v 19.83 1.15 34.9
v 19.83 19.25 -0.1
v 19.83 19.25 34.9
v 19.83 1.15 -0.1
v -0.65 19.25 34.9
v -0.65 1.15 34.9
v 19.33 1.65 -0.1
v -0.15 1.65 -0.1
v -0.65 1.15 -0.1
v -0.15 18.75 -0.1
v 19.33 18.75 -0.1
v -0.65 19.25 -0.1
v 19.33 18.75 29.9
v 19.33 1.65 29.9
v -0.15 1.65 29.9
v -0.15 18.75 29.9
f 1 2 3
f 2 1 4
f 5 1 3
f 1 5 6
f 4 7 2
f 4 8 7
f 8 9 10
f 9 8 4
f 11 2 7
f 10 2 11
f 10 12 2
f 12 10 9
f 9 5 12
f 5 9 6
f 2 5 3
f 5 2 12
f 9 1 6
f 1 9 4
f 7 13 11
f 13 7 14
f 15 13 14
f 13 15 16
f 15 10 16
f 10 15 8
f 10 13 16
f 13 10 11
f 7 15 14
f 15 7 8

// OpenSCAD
// file: rgb_shield.scad
$fn        = 100;

rgb_pcb_x      = 19;
rgb_pcb_y      = 16.55;
rgb_pcb_z      = 2.4;
rgb_hole_diam  = 1;
rgb_hole_pitch = 2.6;
rgb_hole_offset = 1.4;

module rgb_pcb() {
  color("DarkOliveGreen")
  difference() {
    cube(size=[rgb_pcb_x, rgb_pcb_y, rgb_pcb_z]);

    for ( i = [0 : 5] ) {
      translate([rgb_hole_offset + (i * rgb_hole_pitch), rgb_pcb_y - rgb_hole_offset, 0])
      cylinder(r=rgb_hole_diam/2, h=10, center=true);
    }

    for ( i = [0 : 2] ) {
      translate([rgb_pcb_x - rgb_hole_offset, rgb_hole_offset + (i * rgb_hole_pitch), 0])
      cylinder(r=rgb_hole_diam/2, h=10, center=true);
    }
  }
}

module resistor() {
  res_end_r = 1.14;
  res_l = 6.7;
  pitch = 7.7;
  lead_r = 0.2;

  translate([0,0,res_end_r]) {
    color("Tan")
    translate([(pitch - res_l + res_end_r)/2,0,0]) {
      translate([res_end_r,0,0]) sphere(res_end_r);
      translate([res_end_r/2,0,0]) rotate([0,90,0]) cylinder(r=0.95, h=res_l - (res_end_r*2));
      translate([res_l - (res_end_r*2),0,0]) sphere(res_end_r);
    }

    color("Silver") translate([lead_r/2, 0, 0]) sphere(lead_r);
    color("Silver") translate([lead_r/2, 0, 0]) rotate([0,90,0]) cylinder(r=lead_r, h=pitch - lead_r);
    color("Silver") translate([pitch - lead_r/2, 0, 0]) sphere(lead_r);
  }

  color("Silver") translate([lead_r/2,0,0]) cylinder(r=lead_r, h=res_end_r);
  color("Silver") translate([pitch - lead_r/2,0,0]) cylinder(r=lead_r, h=res_end_r);
}

module led() {
  led_r = 2.5;
  led_h = 8.8;
  ridge_r = 2.935;
  lead_pitch = 1.625;
  lead_length = 5;
  lead_lw = 0.7;
  below_pcb = 0.3;

  color("White")
  translate([0,0,lead_length - below_pcb])
  difference() {
    union() {
      translate([0,0,led_h-led_r]) sphere(r=led_r);
      cylinder(r=led_r, h=led_h-led_r);
      cylinder(r=ridge_r, h=1);
    }
    translate([led_r,-5,-1]) cube(size=[10, 10, 10]);
  }
  color("Silver") {
    for ( i = [-1.5 : 1.5] ) {
      translate([(i * -lead_pitch)-lead_lw/4,0,-below_pcb+lead_length/2]) cube(size=[lead_lw, lead_lw, lead_length], center=true);
    }
  }
}

module rgb_header() {
  cube(size=[2.6, 2.6, 2.6], center=true);
}

module rgb_headers() {
  for ( i = [0 : 5] ) {
    color("DimGray")
    translate([rgb_hole_offset + (i * rgb_hole_pitch), rgb_pcb_y - rgb_hole_offset, -1.3]) rgb_header();
    translate([rgb_hole_offset + (i * rgb_hole_pitch), rgb_pcb_y - rgb_hole_offset, 1.45-11.3+rgb_pcb_z]) cylinder(r=rgb_hole_diam/2, h=11.3);
  }

  for ( i = [0 : 2] ) {
    color("DimGray")
    translate([rgb_pcb_x - rgb_hole_offset, rgb_hole_offset + (i * rgb_hole_pitch), -1.3]) rgb_header();
    translate([rgb_pcb_x - rgb_hole_offset, rgb_hole_offset + (i * rgb_hole_pitch), 1.45-11.3+rgb_pcb_z]) cylinder(r=rgb_hole_diam/2, h=11.3);
  }
}

module shield_assembly() {
  rgb_pcb();
  translate([1.15,2.4,rgb_pcb_z]) rotate([0,0,90]) resistor();
  translate([3.65,2.4,rgb_pcb_z]) rotate([0,0,90]) resistor();
  translate([14.9,2.4,rgb_pcb_z]) rotate([0,0,90]) resistor();
  translate([9.71,7,0]) led();
  rgb_headers();
}

// shield_assembly();
// file: digispark.scad
$fn        = 50;

pcb_x      = 19.18;
pcb_y      = 17.66;
pcb_z      = 2.4;
usb_x      = 12.26;
usb_y      = 8.79;
hole_diam  = 1;
hole_pitch = 2.6;
hole_offset = 1.4;

module pcb() {
  color("DarkOliveGreen")
  difference() {
    union() {
      // main PCB
      cube(size=[pcb_x, pcb_y, pcb_z], center=false);

      // USB connector
      translate([(pcb_x - usb_x)/2,-usb_y,0])
      cube(size=[usb_x, usb_y, pcb_z], center=false);
    }

    for ( i = [0 : 5] ) {
      translate([hole_offset + (i * hole_pitch), pcb_y - hole_offset, 0])
      cylinder(r=hole_diam/2, h=10, center=true);
    }

    for ( i = [0 : 2] ) {
      translate([pcb_x - hole_offset, hole_offset + 1.2 + (i * hole_pitch), 0])
      cylinder(r=hole_diam/2, h=10, center=true);
    }
  }

  pad_spacing_a = 1.00;
  pad_spacing_b = 0.65;
  pad_a = [1.96, 8.0, 0.02];
  pad_b = [1.48, 6.9, 0.02];
  usb_pad_width = (pad_spacing_a * 2) + (pad_spacing_b * 2) + (pad_a[0] * 2) + (pad_b[0] * 2);


  color("Gold") {
    for ( i = [0 : 5] ) {
      difference() {
        translate([hole_offset + (i * hole_pitch), pcb_y - hole_offset, pcb_z])
        cylinder(r=hole_diam, h=0.02, center=true);
        translate([hole_offset + (i * hole_pitch), pcb_y - hole_offset, 0])
        cylinder(r=hole_diam/2, h=10, center=true);
      }

    }

    for ( i = [0 : 2] ) {
      difference() {
        translate([pcb_x - hole_offset, hole_offset + 1.2 + (i * hole_pitch), pcb_z])
        cylinder(r=hole_diam, h=0.02, center=true);
        translate([pcb_x - hole_offset, hole_offset + 1.2 + (i * hole_pitch), 0])
        cylinder(r=hole_diam/2, h=10, center=true);
      }
    }

    translate([usb_pad_width/2 - (pad_a[0] - pad_b[0])/2,0,0]) {
      translate([    0, -8.0, pcb_z]) cube(size=pad_a);
      translate([ pad_a[0] + pad_spacing_a, -6.9, pcb_z]) cube(size=pad_b);
      translate([ pad_a[0] + pad_b[0] + pad_spacing_a + pad_spacing_b, -6.9, pcb_z]) cube(size=pad_b);
      translate([ pad_a[0] + pad_b[0] + pad_b[0] + pad_spacing_a + pad_spacing_b + pad_spacing_a, -8.0, pcb_z]) cube(size=pad_a);
    }
  }

}

module vreg_leg() {
  color("Silver")
  union() {
    translate([0, 0, 0.8]) cube(size=[0.8, 0.8, 0.8], center=false);
    translate([0, 1.36, -0.1]) rotate([45,0,0])  cube(size=[0.8, 0.8, 1.6], center=false);
    translate([0, 0.8, 0]) cube(size=[0.8, 2.2, 0.8], center=false);
  }
}

module atmel_leg() {
  color("Silver")
  union() {
    translate([0, 0, 0.48]) cube(size=[0.48, 0.48, 0.48], center=false);
    translate([0, 0.82, -0.06]) rotate([45,0,0])  cube(size=[0.48, 0.48, 0.96], center=false);
    translate([0, 0.48, 0]) cube(size=[0.48, 1.16, 0.48], center=false);
  }
}

module smd_comp() {
  color("Silver") translate([0,0,0]) cube(size=[0.48, 0.35, 0.2], center=false);
  color("DimGray") translate([0,0.35,0]) cube(size=[0.48, 0.55, 0.2], center=false);
  color("Silver") translate([0,0.35+0.55,0]) cube(size=[0.48, 0.35, 0.2], center=false);
}

module chips() {
  // vreg
  vreg_w = 7;
  vreg_l = 5;
  vreg_x = 7.5;
  vreg_y = 3.9;
  vreg_x2 = vreg_x + vreg_w;
  vreg_y2 = vreg_y + vreg_l;

  color("DimGray") translate([vreg_x, 3.9, pcb_z]) cube(size=[7, 5, 2.35], center=false);
  color("Silver") translate([(vreg_x + (7 - 5.45)/2), 3.9-1.4, pcb_z]) cube(size=[5.45, 1.4, 0.39], center=false);

  translate([vreg_x, vreg_y2, pcb_z]) vreg_leg();
  translate([vreg_x - 0.4 + vreg_w/2, vreg_y2, pcb_z]) vreg_leg();
  translate([vreg_x2 - 0.8, vreg_y2, pcb_z]) vreg_leg();

  // atmel
  color("DimGray")
  translate([0.25, 6.16, pcb_z]) cube(size=[5.11, 5.11, 1.44], center=false);

  atmel_pitch = 5.11/3 - 0.48/2;

  for ( i = [0 : 3] ) {
     translate([0.25+0.48+(0.48/4) + (atmel_pitch*i),6.16,pcb_z]) rotate([0,0,180]) atmel_leg();
  }

  for ( i = [0 : 3] ) {
     translate([0.25+(0.48/4) + (atmel_pitch*i),6.16 + 5.11,pcb_z]) atmel_leg();
  }

  translate([0.2,1.75,pcb_z]) smd_comp();
  translate([0.88,1.75,pcb_z]) smd_comp();
  translate([6.4,2.8,pcb_z]) smd_comp();

  color("DimGray")
  translate([3.26,0.5,pcb_z]) cube(size=[1.66, 1.27, 0.94], center=false);

  color("DimGray")
  translate([5.75,5.5,pcb_z]) cube(size=[1.27, 1.66, 0.94], center=false);

  color("DimGray")
  translate([pcb_x - 0.05 - 1.58, pcb_y - 1.88 - 2.58 ,pcb_z]) cube(size=[1.58, 2.5, 1], center=false);

  color("DimGray")
  translate([10.5,13,pcb_z]) cube(size=[1.27, 1.66, 0.94], center=false);

  translate([6.4,11,pcb_z]) smd_comp();

  translate([pcb_x - 0.5,10,pcb_z]) rotate([0,0,90]) smd_comp();

}

module header() {
  difference() {
    cube(size=[2.6, 2.6, 7.8], center=true);
    cube(size=[1.5, 1.5, 10], center=true);
  }
}

module headers() {
  for ( i = [0 : 5] ) {
    color("DimGray")
    translate([hole_offset + (i * hole_pitch), pcb_y - hole_offset, 3.9 + pcb_z + 0.65]) header();
    translate([hole_offset + (i * hole_pitch), pcb_y - hole_offset, -1.24]) cylinder(r=hole_diam/2, h=4.46);
  }

  for ( i = [0 : 2] ) {
    color("DimGray")
    translate([pcb_x - hole_offset, hole_offset + 1.2 + (i * hole_pitch), 3.9 + pcb_z + 0.65]) header();
    translate([pcb_x - hole_offset, hole_offset + 1.2 + (i * hole_pitch), -1.24]) cylinder(r=hole_diam/2, h=4.46);
  }
}

// pcb();
// chips();
// headers();
// main file
include <digispark.scad>;
include <rgb_shield.scad>;

usb_x      = 12.26;
usb_y      = 8.79;

module digi() {
  // translate([(pcb_x - usb_x)/2,-usb_y,-0.2])
  // cube(size=[usb_x, usb_y, pcb_z], center=false);
  pcb();
  chips();
  headers();
  translate([0,1.2,14])
  shield_assembly();
}


pcb_x           = 19.18;
pcb_y           = 16.8;
wall_width      = 0.5;
layer_thickness = 0.27;
skin_thickness  = layer_thickness * 2;
cavity_height   = 30;
pcb_buffer      = 0.3;
$fn=20;

union() {
  difference() {
    difference() {
        translate([-wall_width - (pcb_buffer/2),-wall_width - (pcb_buffer/2) + 1.8,-0.1])
        cube(size=[pcb_buffer + pcb_x + (wall_width * 2), pcb_buffer + pcb_y + (wall_width * 2), cavity_height + 5]);

        translate([-(pcb_buffer/2),-(pcb_buffer/2) + 1.8,-0.2])
        cube(size=[pcb_buffer + pcb_x, pcb_buffer + pcb_y, cavity_height + 0.1]);
    }
    // translate([10,-5,-5]) cube(size=[30, 30, 60]);

  }

  // translate([pcb_x/2 - 2,-pcb_buffer,pcb_z]) cube(size=[4, 1.5, 2]);
  // translate([-pcb_buffer,-pcb_buffer,pcb_z]) cube(size=[2, 1.5, 2]);
  // translate([-pcb_buffer,13.2,pcb_z]) cube(size=[2, 1.5, 2]);
  // translate([pcb_x-2+pcb_buffer,pcb_y-1.5+pcb_buffer,pcb_z]) cube(size=[2, 1.5, 2]);
  // translate([pcb_x-2+pcb_buffer,-pcb_buffer,pcb_z]) cube(size=[2, 1.5, 2]);
}
// digi();
